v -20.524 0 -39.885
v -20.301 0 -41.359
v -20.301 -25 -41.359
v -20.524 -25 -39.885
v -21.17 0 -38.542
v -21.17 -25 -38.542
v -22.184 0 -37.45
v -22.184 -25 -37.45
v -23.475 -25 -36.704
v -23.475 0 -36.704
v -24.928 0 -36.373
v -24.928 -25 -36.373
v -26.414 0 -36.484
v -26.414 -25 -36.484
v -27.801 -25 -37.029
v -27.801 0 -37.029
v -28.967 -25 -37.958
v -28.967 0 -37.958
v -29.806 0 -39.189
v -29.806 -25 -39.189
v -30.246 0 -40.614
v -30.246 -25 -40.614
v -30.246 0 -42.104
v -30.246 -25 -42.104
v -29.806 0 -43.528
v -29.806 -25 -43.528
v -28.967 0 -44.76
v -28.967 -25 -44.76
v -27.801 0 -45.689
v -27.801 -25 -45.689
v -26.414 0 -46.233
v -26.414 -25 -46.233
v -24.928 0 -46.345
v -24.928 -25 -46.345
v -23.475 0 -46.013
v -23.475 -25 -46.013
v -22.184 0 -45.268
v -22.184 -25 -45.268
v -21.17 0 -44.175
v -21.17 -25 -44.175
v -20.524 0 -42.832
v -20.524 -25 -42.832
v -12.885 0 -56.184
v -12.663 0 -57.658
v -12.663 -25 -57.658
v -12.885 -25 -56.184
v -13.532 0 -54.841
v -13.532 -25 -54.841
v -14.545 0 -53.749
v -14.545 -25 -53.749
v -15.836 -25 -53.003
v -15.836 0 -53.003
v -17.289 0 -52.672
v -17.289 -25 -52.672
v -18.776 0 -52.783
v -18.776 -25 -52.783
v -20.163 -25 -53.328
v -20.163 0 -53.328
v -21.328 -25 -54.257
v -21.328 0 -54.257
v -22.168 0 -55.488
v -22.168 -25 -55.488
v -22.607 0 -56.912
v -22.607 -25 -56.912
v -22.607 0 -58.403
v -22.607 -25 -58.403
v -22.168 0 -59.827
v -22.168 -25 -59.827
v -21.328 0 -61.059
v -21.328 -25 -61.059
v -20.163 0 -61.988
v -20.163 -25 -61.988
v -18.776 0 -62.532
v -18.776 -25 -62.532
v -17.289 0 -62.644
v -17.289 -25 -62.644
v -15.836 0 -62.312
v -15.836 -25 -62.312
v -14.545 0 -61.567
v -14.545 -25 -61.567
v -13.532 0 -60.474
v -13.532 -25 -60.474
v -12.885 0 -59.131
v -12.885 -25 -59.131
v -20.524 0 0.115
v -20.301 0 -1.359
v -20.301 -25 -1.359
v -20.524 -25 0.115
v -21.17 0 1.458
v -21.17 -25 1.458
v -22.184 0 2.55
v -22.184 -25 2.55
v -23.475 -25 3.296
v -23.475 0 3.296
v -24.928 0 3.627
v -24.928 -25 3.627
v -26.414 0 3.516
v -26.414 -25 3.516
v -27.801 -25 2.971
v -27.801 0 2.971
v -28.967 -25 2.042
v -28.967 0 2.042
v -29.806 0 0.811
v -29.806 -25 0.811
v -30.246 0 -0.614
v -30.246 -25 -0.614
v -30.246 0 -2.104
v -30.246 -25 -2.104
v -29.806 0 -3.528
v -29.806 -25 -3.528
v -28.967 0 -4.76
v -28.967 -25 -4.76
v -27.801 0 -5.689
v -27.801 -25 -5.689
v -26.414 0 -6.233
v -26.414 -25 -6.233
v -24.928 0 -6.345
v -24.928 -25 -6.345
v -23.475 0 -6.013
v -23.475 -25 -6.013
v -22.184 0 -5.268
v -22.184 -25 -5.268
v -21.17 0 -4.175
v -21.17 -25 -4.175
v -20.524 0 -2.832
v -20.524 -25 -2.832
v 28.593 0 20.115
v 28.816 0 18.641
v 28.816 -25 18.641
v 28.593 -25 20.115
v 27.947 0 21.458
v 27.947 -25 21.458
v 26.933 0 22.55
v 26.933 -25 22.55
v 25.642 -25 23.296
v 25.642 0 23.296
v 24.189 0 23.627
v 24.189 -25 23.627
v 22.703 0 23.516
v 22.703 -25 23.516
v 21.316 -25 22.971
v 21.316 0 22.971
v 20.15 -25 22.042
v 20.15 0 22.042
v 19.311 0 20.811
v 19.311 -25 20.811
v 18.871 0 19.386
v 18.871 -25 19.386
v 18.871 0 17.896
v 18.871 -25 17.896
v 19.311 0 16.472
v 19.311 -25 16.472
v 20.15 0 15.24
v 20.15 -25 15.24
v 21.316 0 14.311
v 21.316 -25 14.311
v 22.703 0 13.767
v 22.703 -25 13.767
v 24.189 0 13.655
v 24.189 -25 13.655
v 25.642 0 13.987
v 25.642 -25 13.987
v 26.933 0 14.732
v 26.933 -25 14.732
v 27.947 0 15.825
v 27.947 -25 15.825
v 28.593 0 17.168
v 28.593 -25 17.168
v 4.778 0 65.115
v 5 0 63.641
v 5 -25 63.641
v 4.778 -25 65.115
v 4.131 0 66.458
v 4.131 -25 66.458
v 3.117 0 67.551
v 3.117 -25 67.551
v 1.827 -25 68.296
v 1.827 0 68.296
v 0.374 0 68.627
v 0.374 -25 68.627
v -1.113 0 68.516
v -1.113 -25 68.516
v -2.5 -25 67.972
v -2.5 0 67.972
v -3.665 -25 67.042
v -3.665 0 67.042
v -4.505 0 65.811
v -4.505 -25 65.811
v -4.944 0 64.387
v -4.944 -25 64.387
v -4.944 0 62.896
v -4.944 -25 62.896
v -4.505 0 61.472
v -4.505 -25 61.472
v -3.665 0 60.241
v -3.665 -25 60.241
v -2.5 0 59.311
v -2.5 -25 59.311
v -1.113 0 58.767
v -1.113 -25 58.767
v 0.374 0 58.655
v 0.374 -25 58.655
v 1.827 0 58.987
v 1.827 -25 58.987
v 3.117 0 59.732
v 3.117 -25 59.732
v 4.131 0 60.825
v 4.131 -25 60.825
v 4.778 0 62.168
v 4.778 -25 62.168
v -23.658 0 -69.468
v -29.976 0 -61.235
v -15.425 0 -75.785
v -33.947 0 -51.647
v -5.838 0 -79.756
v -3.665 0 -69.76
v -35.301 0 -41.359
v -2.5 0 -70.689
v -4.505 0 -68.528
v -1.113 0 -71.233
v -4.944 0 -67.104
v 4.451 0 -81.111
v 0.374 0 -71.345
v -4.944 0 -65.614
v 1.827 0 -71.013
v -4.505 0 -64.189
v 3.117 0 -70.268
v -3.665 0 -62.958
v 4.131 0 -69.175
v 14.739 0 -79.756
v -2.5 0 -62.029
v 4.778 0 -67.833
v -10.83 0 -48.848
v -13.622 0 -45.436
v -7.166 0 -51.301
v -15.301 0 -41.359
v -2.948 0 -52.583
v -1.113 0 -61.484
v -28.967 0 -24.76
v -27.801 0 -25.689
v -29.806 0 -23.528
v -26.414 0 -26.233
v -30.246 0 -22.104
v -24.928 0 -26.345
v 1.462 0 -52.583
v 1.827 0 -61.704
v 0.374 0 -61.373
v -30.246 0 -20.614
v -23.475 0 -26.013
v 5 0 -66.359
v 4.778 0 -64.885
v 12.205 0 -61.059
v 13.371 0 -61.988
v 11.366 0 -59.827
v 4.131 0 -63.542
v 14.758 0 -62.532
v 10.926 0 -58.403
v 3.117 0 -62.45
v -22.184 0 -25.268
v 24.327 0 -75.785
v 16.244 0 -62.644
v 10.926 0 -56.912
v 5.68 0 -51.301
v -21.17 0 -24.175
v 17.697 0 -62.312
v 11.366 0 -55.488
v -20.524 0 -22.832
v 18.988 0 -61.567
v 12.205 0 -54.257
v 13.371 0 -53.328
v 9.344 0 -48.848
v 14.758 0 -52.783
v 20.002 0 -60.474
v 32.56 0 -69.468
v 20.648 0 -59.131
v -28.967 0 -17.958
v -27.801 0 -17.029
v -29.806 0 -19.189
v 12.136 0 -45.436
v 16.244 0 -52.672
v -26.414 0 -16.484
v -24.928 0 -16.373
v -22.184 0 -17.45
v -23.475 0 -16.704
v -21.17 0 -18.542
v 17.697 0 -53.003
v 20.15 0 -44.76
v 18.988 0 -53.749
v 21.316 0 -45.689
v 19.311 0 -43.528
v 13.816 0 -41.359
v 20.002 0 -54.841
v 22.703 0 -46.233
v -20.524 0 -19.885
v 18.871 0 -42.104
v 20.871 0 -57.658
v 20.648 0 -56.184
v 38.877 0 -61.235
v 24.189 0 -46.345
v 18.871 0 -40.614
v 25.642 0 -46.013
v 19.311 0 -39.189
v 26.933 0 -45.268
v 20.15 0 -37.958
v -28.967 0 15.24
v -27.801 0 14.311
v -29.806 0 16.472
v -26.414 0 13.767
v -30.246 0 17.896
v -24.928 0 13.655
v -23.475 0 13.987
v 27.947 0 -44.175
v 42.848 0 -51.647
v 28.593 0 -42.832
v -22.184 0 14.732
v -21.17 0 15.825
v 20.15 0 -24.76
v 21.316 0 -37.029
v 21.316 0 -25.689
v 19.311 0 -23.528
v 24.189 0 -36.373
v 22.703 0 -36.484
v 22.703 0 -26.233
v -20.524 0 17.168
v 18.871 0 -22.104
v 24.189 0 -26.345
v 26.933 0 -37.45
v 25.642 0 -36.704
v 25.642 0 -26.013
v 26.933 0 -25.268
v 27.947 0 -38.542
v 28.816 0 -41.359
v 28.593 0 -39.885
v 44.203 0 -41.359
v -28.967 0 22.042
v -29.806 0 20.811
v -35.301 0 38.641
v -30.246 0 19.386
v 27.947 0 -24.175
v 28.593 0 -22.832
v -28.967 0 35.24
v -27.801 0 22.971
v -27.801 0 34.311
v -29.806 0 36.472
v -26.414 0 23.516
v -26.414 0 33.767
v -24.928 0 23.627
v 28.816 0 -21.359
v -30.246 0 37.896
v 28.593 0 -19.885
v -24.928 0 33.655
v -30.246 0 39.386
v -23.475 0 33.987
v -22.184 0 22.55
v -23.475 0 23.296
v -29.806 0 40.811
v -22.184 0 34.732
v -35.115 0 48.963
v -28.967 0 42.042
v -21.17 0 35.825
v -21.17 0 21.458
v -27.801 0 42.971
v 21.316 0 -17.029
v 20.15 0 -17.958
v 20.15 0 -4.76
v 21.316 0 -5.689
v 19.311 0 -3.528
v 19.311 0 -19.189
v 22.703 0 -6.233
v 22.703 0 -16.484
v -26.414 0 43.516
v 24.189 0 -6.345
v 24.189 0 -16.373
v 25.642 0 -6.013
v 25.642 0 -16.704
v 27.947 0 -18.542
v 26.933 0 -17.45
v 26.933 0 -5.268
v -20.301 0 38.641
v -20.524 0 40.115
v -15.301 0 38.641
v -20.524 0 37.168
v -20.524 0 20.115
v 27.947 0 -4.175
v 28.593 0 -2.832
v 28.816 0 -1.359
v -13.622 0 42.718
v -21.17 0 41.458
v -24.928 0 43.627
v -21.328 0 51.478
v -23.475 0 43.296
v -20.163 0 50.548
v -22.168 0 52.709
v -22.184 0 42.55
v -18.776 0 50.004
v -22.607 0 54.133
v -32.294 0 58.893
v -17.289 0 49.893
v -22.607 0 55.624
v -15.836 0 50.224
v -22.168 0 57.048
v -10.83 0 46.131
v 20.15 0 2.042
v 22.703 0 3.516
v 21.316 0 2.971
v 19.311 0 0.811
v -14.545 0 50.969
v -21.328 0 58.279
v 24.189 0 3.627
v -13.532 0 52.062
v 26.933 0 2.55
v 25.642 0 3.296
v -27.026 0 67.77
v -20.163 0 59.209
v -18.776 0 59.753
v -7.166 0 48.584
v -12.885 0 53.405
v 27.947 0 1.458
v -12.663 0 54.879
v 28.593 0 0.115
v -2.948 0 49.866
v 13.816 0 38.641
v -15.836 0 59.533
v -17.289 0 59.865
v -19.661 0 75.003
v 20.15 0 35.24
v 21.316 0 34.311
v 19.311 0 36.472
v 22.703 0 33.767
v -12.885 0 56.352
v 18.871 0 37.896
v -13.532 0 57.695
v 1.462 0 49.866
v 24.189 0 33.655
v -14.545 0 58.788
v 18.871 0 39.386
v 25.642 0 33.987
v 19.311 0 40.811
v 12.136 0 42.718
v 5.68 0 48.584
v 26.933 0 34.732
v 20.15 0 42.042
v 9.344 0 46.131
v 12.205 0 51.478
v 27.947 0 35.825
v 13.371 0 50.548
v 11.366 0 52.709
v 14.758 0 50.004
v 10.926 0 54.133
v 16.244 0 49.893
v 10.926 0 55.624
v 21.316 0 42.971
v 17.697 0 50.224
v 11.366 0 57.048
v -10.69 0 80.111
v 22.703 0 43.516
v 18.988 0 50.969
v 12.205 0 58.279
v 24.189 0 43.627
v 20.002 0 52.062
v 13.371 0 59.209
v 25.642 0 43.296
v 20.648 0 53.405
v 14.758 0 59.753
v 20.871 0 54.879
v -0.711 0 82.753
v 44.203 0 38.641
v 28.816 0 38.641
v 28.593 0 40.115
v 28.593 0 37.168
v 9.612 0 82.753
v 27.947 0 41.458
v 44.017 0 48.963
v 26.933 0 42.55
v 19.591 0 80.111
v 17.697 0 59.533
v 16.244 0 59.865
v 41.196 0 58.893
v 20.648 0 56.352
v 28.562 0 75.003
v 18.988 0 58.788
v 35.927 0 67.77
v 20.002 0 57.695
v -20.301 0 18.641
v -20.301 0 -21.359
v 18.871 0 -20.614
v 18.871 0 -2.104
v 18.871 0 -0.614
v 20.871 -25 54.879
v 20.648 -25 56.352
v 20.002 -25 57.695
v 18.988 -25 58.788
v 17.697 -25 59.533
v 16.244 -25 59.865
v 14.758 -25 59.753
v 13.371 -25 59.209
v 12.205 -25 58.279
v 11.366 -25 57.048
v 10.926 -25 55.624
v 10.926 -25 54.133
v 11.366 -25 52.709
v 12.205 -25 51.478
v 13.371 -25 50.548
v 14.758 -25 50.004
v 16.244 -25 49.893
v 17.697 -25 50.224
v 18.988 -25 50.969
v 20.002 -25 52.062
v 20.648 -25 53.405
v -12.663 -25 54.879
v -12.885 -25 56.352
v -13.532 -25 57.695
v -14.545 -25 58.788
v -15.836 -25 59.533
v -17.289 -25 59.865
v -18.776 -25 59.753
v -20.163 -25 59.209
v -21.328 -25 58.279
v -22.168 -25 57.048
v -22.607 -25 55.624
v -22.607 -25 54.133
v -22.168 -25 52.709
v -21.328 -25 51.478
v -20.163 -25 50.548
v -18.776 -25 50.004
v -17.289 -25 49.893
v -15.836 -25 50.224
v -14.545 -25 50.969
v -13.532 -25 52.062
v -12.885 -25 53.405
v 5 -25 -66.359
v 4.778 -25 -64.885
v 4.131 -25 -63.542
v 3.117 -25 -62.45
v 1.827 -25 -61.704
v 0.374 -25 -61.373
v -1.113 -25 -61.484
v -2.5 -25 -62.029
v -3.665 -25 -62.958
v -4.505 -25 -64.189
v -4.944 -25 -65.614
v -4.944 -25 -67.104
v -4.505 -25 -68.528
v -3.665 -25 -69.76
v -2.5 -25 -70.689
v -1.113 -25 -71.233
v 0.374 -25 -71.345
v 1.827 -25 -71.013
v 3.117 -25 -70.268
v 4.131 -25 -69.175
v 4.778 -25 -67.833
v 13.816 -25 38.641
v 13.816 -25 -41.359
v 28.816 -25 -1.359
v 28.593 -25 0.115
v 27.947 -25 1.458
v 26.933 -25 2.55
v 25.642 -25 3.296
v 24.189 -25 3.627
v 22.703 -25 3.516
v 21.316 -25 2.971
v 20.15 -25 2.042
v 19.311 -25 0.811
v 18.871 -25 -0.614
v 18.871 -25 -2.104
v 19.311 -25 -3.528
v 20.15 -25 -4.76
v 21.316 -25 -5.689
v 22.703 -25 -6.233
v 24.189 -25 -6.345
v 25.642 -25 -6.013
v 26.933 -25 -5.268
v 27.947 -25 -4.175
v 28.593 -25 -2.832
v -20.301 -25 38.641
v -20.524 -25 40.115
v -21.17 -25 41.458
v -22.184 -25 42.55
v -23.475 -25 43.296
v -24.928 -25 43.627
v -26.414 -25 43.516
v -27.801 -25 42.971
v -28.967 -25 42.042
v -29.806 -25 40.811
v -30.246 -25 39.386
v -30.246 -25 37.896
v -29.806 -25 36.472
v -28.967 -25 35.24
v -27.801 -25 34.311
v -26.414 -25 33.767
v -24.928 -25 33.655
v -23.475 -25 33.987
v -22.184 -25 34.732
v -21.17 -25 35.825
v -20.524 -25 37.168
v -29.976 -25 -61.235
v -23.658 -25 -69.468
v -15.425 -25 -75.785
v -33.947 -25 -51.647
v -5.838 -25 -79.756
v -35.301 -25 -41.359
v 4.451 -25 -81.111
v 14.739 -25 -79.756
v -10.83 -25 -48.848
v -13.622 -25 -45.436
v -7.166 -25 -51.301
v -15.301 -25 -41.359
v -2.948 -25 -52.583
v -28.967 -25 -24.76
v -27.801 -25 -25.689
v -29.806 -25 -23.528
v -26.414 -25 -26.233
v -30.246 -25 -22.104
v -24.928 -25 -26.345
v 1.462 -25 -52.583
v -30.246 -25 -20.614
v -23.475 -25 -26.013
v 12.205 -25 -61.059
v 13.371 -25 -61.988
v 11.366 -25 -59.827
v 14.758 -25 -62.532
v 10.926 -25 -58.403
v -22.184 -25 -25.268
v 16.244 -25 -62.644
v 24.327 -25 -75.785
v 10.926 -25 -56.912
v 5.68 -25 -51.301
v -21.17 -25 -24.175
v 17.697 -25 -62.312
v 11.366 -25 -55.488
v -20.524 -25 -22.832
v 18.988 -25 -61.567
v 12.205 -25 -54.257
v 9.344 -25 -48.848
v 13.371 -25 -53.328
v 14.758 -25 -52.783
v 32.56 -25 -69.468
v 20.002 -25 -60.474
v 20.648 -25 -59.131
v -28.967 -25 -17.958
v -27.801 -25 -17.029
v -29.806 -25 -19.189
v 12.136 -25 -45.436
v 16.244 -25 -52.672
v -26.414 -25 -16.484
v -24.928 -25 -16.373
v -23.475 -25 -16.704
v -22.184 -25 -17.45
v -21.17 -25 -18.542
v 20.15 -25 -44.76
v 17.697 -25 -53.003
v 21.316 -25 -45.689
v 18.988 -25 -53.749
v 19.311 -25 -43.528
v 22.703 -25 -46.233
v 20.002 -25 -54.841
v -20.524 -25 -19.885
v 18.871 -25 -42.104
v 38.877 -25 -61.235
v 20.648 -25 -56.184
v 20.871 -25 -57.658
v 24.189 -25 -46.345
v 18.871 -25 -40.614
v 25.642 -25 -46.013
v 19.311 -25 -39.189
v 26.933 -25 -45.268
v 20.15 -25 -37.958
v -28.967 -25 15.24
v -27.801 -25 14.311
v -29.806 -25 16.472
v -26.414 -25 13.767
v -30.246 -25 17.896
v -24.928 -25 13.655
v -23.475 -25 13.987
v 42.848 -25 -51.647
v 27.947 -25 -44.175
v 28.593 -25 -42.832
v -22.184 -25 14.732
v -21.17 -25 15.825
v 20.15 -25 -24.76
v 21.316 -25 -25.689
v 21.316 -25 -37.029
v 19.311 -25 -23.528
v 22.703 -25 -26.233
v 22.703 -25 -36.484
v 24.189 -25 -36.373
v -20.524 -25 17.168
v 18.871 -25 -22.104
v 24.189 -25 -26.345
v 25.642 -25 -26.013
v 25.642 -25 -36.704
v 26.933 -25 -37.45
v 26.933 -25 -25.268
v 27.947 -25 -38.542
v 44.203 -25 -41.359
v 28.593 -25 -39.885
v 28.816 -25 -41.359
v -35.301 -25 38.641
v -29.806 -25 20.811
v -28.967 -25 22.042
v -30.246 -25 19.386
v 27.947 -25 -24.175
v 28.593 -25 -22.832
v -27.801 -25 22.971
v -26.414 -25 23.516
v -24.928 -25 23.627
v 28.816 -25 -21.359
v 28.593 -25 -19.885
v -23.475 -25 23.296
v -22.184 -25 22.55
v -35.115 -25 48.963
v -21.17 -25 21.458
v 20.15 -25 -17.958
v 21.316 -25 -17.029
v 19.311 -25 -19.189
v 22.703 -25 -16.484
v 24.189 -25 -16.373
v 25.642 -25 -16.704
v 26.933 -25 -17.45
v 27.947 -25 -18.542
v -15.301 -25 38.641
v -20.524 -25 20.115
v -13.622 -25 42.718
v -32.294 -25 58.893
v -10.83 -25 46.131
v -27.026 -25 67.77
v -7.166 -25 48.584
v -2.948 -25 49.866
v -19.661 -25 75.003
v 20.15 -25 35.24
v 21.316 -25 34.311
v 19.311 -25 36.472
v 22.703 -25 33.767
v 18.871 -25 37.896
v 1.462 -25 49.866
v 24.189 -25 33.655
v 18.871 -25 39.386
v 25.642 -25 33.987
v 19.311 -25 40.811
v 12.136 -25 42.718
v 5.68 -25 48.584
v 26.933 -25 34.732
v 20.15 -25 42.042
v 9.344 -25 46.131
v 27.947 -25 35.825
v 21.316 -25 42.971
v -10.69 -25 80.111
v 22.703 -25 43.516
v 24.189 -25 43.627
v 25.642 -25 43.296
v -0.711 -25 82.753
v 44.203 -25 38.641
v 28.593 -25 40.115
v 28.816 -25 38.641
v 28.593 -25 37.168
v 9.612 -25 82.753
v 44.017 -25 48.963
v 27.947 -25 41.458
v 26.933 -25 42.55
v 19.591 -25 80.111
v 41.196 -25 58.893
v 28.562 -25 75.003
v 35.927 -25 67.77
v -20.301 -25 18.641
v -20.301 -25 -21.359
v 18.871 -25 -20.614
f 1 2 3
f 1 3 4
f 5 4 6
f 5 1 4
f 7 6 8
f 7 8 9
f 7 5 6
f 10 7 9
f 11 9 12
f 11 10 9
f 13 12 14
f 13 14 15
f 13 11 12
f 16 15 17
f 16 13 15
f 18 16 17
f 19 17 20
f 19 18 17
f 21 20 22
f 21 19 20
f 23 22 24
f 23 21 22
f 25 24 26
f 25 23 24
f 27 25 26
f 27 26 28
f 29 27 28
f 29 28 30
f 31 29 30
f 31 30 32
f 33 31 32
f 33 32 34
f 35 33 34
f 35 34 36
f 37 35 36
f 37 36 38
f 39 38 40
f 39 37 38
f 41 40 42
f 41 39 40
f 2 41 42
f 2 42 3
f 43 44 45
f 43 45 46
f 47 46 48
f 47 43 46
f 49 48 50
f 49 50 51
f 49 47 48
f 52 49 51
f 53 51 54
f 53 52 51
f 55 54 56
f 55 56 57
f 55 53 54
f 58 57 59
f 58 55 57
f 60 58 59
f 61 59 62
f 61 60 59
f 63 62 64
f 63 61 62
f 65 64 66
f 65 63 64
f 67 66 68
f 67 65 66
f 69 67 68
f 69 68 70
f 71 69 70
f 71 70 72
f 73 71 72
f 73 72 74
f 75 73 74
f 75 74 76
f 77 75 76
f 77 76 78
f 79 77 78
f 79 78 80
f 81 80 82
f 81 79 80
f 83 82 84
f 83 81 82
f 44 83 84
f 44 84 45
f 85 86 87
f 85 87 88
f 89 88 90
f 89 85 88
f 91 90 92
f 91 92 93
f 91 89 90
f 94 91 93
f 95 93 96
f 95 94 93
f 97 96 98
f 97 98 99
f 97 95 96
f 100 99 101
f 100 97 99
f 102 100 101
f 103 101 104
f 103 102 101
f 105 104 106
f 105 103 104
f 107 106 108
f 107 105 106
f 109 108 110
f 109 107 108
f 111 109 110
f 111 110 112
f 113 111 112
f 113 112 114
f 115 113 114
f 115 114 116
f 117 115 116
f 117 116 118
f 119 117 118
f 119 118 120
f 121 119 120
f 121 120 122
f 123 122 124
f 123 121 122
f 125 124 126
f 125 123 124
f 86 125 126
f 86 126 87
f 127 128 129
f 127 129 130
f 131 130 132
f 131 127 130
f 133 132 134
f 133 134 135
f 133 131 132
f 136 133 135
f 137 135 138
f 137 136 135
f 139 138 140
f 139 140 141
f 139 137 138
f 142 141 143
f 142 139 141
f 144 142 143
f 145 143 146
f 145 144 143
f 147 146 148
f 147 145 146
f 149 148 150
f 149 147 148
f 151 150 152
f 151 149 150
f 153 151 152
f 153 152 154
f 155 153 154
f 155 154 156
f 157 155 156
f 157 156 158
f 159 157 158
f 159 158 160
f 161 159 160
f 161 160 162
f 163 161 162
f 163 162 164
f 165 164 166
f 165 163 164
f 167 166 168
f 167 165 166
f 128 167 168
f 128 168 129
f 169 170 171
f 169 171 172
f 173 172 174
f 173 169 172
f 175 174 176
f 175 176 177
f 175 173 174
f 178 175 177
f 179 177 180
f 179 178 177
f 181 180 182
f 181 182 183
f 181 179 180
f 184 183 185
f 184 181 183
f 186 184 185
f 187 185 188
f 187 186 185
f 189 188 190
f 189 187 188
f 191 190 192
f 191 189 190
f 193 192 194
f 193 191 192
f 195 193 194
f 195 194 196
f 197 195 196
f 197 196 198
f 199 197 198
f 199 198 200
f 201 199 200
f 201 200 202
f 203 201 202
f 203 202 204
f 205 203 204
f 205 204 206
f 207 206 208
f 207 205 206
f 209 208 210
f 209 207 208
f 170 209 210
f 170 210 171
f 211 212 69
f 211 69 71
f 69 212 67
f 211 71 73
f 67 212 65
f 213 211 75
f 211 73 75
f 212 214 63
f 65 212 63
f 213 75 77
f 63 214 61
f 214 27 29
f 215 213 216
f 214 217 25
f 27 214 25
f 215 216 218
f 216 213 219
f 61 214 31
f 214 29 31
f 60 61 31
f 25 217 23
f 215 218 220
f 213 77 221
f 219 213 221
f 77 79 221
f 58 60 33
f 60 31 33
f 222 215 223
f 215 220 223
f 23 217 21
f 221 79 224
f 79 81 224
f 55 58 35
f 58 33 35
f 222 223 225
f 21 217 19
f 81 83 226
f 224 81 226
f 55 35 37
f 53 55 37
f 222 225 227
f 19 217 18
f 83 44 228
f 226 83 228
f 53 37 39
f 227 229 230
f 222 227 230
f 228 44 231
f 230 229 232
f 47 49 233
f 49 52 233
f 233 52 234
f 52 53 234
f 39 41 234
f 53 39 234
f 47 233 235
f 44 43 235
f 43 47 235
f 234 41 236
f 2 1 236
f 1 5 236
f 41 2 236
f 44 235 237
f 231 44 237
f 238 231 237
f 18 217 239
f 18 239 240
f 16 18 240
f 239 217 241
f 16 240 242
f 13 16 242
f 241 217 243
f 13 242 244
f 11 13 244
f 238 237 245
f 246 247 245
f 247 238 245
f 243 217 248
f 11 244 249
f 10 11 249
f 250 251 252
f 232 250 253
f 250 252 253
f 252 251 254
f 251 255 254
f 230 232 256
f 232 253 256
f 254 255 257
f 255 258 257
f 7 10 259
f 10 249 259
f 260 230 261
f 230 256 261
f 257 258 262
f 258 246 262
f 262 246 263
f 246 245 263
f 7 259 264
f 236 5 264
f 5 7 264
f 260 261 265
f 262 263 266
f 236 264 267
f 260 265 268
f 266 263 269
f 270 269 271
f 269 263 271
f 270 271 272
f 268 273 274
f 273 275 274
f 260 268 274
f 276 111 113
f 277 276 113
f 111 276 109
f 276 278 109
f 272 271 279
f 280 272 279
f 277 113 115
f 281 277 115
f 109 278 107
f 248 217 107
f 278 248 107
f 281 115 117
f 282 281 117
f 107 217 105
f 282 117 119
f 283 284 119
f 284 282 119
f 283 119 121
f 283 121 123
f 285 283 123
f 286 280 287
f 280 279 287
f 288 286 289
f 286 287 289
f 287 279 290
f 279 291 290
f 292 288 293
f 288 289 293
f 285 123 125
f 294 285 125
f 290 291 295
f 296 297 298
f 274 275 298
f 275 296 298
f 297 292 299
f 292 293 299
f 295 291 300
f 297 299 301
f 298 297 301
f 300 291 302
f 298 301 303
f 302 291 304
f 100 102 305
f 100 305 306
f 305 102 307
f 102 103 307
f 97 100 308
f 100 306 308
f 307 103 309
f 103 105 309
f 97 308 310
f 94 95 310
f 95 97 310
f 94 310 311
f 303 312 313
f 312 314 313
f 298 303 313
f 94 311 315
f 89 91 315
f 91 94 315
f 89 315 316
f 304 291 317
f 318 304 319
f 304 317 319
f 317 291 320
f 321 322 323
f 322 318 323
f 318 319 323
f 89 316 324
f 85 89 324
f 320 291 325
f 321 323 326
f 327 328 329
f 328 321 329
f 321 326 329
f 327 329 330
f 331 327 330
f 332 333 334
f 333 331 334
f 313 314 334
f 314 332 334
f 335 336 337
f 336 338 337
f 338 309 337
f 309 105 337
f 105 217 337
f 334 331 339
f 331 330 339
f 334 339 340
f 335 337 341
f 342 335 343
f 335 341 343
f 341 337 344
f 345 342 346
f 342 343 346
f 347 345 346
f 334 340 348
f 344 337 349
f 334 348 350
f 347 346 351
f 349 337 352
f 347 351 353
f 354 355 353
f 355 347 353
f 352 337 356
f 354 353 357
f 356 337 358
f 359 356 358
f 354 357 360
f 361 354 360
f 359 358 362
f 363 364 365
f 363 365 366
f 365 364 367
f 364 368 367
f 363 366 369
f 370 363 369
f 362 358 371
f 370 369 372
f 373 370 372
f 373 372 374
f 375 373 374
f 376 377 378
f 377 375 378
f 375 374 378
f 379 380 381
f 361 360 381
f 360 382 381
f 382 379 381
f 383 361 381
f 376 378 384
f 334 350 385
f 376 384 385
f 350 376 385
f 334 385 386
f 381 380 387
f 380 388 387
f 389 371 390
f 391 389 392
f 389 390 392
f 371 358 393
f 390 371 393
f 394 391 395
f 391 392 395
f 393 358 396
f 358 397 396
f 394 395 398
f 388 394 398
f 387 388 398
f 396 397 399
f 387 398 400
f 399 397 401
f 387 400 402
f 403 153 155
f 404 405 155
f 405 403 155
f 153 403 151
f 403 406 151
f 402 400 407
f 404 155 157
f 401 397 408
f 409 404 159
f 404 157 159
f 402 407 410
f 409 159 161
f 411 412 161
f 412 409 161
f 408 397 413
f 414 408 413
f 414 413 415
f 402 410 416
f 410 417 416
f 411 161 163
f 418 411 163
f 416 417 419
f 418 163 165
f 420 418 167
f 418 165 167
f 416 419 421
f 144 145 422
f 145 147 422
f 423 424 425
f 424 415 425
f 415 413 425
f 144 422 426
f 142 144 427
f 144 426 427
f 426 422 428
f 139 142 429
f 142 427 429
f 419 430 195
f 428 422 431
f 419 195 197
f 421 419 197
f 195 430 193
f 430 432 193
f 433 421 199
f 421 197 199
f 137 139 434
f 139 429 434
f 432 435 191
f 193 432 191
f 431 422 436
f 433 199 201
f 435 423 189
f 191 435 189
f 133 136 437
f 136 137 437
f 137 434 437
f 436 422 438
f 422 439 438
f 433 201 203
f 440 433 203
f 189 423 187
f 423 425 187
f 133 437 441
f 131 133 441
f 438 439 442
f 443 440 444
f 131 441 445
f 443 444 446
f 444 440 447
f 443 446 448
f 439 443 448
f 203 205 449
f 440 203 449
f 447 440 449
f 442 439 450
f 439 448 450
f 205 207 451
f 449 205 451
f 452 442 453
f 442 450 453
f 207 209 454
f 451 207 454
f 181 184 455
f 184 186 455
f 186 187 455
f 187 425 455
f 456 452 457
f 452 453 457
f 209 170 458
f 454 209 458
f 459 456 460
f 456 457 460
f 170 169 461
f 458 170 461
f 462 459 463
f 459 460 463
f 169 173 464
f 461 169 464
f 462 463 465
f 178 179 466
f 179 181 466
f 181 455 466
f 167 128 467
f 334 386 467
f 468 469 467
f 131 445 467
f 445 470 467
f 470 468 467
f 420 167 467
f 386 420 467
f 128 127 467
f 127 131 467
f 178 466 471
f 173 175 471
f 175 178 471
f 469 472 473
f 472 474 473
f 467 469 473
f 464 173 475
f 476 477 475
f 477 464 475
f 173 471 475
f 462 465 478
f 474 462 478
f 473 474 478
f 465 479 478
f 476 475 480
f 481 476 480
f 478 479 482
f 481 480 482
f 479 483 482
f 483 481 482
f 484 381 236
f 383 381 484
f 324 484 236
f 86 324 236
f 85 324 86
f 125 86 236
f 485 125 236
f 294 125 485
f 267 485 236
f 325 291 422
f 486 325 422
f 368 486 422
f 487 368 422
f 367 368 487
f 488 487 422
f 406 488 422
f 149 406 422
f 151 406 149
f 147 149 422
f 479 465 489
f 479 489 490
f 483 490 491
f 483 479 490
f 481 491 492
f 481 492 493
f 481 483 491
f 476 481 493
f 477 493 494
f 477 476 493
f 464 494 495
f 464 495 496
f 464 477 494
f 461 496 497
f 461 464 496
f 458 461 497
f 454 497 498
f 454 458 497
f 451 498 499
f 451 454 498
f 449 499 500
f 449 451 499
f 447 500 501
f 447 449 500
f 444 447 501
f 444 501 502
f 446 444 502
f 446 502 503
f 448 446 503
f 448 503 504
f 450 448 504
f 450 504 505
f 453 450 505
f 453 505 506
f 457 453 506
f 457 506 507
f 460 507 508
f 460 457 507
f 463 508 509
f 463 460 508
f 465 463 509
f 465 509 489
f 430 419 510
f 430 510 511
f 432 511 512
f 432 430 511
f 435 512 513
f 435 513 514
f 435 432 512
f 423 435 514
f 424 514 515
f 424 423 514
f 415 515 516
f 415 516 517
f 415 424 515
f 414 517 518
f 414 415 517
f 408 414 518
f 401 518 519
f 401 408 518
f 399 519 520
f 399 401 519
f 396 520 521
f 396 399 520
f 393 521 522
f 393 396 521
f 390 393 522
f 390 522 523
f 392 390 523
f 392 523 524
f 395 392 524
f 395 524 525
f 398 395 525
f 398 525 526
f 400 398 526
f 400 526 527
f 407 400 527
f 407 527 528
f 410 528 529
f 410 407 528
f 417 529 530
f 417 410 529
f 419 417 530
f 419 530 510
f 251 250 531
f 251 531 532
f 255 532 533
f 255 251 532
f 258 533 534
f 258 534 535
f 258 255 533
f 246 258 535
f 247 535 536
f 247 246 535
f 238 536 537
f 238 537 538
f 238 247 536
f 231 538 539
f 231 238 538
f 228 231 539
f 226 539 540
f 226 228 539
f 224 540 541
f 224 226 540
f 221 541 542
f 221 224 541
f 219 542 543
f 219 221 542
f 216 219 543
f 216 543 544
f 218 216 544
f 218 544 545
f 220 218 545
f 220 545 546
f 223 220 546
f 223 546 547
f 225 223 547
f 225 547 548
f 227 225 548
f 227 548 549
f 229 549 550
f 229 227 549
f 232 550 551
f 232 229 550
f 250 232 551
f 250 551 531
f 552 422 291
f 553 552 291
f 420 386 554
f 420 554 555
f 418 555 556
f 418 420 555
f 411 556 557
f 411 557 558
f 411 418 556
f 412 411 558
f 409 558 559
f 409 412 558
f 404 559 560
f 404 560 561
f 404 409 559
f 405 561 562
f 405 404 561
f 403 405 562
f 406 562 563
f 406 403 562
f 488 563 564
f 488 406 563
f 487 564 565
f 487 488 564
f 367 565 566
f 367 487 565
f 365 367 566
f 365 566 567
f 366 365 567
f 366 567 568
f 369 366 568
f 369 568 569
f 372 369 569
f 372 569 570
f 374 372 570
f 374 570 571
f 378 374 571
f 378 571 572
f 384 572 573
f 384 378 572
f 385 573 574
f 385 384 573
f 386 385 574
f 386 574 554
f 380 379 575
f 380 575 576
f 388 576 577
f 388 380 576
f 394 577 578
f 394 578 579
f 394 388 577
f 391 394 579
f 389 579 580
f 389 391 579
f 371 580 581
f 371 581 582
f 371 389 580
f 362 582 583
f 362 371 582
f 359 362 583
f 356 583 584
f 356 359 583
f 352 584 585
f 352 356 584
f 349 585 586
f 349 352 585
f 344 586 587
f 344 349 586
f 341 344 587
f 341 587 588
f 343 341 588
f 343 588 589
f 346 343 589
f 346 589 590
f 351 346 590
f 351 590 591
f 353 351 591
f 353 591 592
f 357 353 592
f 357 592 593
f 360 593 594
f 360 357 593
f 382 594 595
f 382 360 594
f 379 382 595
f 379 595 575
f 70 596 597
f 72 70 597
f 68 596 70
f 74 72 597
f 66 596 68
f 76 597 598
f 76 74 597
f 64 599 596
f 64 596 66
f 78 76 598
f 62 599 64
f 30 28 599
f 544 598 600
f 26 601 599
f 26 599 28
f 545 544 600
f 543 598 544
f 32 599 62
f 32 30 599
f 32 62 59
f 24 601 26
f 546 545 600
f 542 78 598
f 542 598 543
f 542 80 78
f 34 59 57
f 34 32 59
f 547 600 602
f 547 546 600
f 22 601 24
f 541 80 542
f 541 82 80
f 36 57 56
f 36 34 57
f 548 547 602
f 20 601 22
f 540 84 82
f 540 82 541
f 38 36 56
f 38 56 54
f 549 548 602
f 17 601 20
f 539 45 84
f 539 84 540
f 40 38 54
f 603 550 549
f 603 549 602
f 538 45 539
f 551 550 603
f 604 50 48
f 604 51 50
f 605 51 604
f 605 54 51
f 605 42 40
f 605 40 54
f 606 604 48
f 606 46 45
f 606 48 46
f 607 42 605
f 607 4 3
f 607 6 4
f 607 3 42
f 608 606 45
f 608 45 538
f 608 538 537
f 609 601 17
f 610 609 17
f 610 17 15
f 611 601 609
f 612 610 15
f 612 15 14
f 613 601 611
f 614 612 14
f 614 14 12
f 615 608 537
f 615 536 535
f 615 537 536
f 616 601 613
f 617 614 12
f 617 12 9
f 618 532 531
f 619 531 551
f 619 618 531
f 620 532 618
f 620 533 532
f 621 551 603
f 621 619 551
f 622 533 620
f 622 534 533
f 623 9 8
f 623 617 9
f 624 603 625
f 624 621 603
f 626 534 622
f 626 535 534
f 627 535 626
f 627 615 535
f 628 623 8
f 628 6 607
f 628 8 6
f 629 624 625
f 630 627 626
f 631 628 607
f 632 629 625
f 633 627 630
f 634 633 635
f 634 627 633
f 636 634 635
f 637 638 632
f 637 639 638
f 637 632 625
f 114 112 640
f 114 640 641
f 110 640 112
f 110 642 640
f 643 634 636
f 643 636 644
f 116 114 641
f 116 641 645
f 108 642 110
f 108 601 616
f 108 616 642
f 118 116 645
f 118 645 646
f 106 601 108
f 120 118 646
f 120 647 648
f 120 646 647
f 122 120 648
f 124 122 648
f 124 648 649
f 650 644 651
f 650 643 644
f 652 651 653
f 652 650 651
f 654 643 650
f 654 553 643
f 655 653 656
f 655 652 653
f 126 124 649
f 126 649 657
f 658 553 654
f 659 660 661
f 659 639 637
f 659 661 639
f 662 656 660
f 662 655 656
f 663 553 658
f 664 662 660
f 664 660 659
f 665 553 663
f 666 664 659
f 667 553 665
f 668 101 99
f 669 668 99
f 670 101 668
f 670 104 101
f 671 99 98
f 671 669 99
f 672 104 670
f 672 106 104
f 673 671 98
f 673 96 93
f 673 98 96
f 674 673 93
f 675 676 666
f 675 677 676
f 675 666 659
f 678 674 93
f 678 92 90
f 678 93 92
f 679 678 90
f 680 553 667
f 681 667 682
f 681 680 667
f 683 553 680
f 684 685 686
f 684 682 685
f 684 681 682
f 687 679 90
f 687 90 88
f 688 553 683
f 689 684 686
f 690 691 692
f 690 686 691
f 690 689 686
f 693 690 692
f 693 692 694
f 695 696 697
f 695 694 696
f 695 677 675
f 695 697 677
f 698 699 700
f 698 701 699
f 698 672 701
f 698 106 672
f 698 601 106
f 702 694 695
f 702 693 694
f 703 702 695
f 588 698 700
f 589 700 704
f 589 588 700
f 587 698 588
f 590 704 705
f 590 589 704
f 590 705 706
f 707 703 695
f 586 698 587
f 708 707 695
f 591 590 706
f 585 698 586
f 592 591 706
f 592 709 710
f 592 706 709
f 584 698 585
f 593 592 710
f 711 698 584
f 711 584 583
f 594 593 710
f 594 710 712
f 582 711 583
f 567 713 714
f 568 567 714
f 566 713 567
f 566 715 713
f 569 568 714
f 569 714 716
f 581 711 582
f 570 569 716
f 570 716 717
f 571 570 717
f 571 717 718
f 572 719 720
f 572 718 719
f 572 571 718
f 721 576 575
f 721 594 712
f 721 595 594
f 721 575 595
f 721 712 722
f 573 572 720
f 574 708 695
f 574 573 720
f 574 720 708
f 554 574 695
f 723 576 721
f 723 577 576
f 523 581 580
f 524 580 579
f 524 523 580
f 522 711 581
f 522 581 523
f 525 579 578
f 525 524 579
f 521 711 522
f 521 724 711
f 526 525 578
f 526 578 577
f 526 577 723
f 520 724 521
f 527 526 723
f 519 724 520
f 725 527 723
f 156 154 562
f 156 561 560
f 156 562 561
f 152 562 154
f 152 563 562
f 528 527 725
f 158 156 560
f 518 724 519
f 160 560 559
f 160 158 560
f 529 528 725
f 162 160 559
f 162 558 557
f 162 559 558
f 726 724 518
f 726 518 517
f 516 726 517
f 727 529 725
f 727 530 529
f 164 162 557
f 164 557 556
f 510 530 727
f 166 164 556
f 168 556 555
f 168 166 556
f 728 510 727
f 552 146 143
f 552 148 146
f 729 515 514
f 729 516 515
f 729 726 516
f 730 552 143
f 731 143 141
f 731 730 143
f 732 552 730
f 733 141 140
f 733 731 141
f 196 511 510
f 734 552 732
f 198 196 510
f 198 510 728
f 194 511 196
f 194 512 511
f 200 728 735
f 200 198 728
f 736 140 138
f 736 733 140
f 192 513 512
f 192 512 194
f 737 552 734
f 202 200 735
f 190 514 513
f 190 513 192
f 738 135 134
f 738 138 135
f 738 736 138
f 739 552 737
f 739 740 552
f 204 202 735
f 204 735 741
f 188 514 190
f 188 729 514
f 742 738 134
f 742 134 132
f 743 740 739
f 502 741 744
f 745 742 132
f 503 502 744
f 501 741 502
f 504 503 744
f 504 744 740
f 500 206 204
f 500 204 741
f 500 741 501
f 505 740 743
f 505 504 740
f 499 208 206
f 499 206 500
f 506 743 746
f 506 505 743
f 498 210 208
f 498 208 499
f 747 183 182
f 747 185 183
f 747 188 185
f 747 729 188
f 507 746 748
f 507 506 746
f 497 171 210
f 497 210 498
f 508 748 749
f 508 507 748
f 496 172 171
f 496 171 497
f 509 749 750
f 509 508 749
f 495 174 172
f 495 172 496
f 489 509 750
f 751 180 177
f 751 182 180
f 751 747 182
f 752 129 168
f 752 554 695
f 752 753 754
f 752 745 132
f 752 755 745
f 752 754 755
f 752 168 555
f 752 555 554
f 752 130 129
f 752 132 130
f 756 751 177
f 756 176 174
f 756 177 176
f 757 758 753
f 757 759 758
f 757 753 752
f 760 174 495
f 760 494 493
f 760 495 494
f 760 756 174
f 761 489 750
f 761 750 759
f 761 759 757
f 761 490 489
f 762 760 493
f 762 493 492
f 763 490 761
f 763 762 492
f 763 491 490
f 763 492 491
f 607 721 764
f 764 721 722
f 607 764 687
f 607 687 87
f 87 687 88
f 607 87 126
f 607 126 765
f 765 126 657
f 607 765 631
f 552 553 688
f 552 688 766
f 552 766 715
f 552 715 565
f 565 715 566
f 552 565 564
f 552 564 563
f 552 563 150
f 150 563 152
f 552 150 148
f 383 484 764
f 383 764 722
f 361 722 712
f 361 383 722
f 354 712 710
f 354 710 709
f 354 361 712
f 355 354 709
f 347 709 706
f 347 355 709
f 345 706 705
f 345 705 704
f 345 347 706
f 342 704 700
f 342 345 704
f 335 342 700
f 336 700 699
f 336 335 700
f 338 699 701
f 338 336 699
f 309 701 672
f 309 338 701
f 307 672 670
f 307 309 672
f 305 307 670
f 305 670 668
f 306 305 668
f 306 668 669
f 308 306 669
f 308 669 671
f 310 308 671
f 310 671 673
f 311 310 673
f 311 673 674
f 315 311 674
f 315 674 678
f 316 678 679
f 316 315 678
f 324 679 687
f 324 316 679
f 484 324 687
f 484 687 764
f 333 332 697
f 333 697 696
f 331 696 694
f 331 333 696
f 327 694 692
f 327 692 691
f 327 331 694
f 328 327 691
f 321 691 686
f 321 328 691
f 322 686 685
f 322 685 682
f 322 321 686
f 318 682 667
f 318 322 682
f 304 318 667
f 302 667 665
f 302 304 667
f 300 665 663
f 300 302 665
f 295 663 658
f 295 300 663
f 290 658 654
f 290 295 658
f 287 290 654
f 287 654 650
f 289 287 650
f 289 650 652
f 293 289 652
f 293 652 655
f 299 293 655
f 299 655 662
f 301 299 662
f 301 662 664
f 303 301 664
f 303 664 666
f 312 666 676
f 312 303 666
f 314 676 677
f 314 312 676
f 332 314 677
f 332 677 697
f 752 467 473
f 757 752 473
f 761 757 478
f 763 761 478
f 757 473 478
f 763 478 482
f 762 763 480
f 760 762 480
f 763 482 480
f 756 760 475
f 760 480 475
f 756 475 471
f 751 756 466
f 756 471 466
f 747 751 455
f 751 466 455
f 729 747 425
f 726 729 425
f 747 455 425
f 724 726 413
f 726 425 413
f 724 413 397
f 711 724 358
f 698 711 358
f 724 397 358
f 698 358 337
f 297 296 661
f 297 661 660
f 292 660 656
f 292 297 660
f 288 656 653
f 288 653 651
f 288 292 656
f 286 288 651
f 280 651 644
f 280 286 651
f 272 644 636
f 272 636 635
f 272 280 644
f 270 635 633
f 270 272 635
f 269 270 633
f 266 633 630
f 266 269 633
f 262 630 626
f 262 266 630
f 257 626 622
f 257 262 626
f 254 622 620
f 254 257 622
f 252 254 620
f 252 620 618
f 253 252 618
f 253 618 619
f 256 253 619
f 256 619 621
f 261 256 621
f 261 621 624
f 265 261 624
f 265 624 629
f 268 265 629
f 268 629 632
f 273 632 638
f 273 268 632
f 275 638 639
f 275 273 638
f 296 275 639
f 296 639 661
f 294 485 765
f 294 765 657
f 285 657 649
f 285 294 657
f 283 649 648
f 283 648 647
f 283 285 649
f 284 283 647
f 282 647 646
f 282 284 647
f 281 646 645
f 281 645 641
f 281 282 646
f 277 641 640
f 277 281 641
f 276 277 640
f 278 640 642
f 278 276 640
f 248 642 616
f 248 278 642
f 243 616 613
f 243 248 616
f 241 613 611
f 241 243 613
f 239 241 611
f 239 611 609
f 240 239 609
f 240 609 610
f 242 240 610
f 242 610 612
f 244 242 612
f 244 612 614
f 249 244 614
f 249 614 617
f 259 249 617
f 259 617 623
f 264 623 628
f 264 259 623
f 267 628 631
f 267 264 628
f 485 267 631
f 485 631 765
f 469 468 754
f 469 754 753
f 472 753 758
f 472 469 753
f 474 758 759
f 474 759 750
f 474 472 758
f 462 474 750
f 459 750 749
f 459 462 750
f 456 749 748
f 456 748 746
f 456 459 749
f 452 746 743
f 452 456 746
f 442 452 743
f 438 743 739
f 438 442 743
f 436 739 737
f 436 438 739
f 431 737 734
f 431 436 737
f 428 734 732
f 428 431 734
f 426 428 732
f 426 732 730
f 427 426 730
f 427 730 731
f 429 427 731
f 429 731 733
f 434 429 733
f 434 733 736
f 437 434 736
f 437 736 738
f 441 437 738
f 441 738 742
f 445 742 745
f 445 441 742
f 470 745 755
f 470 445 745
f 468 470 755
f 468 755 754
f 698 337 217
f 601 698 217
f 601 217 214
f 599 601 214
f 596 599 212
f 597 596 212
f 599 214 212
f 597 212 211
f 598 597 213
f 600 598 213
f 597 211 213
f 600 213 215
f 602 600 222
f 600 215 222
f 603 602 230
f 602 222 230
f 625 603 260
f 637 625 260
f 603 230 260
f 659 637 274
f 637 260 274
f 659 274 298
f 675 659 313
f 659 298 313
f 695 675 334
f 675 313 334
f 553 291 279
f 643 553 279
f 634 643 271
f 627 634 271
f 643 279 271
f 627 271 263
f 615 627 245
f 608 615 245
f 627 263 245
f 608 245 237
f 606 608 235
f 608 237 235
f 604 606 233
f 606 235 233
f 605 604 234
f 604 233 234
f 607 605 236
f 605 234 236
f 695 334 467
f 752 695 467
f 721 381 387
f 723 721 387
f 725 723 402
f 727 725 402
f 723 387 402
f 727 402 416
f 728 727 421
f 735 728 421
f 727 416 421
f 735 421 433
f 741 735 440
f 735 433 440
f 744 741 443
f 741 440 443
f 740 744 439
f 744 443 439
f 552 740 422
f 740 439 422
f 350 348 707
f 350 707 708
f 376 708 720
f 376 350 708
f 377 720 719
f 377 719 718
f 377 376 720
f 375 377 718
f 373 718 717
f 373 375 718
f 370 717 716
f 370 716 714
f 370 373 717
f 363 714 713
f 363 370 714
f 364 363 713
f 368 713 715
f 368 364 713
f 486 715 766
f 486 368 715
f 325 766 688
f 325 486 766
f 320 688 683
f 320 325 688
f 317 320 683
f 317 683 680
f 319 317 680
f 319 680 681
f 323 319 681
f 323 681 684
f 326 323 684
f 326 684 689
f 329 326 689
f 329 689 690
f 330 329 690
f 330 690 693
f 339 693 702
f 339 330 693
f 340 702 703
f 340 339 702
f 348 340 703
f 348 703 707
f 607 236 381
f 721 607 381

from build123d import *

# Parameters (mm, degrees)
F0_R     = 5
F1_DEPTH = 25


with BuildPart() as f1:
    # F0 (on Front) → F1 (new body)
    with BuildSketch(Plane.XZ):
        with BuildLine():
            ThreePointArc((44.202886, 38.641287), (4.450733, 83.087214), (-35.301421, 38.641287))
            Line((-35.301421, 38.641287), (-35.301421, -41.358713))
            ThreePointArc((-35.301421, -41.358713), (4.450733, -81.110867), (44.202886, -41.358713))
            Line((44.202886, -41.358713), (44.202886, 38.641287))
        make_face()
        with Locations((-17.662896, -57.657674)):
            Circle(F0_R, mode=Mode.SUBTRACT)
        with Locations((-25.301421, -41.358713)):
            Circle(F0_R, mode=Mode.SUBTRACT)
        with Locations((0, -66.3588)):
            Circle(F0_R, mode=Mode.SUBTRACT)
        with Locations((-25.301421, -21.358713)):
            Circle(F0_R, mode=Mode.SUBTRACT)
        with Locations((-25.301421, -1.358713)):
            Circle(F0_R, mode=Mode.SUBTRACT)
        with BuildLine():
            ThreePointArc((-15.301421, 38.641287), (-0.742925, 50.028783), (13.815571, 38.641287))
            Line((13.815571, 38.641287), (13.815571, -41.358713))
            ThreePointArc((13.815571, -41.358713), (-0.742925, -52.746209), (-15.301421, -41.358713))
            Line((-15.301421, -41.358713), (-15.301421, 38.641287))
        make_face(mode=Mode.SUBTRACT)
        with Locations((15.870508, -57.657674)):
            Circle(F0_R, mode=Mode.SUBTRACT)
        with Locations((23.815571, -41.358713)):
            Circle(F0_R, mode=Mode.SUBTRACT)
        with Locations((23.815571, -21.358713)):
            Circle(F0_R, mode=Mode.SUBTRACT)
        with Locations((23.815571, -1.358713)):
            Circle(F0_R, mode=Mode.SUBTRACT)
        with Locations((-25.301421, 18.641287)):
            Circle(F0_R, mode=Mode.SUBTRACT)
        with Locations((-25.301421, 38.641287)):
            Circle(F0_R, mode=Mode.SUBTRACT)
        with Locations((-17.662896, 54.878572)):
            Circle(F0_R, mode=Mode.SUBTRACT)
        with Locations((0, 63.641374)):
            Circle(F0_R, mode=Mode.SUBTRACT)
        with Locations((23.815571, 18.641287)):
            Circle(F0_R, mode=Mode.SUBTRACT)
        with Locations((23.815571, 38.641287)):
            Circle(F0_R, mode=Mode.SUBTRACT)
        with Locations((15.870508, 54.878572)):
            Circle(F0_R, mode=Mode.SUBTRACT)
    extrude(amount=F1_DEPTH)


solid = f1.part
